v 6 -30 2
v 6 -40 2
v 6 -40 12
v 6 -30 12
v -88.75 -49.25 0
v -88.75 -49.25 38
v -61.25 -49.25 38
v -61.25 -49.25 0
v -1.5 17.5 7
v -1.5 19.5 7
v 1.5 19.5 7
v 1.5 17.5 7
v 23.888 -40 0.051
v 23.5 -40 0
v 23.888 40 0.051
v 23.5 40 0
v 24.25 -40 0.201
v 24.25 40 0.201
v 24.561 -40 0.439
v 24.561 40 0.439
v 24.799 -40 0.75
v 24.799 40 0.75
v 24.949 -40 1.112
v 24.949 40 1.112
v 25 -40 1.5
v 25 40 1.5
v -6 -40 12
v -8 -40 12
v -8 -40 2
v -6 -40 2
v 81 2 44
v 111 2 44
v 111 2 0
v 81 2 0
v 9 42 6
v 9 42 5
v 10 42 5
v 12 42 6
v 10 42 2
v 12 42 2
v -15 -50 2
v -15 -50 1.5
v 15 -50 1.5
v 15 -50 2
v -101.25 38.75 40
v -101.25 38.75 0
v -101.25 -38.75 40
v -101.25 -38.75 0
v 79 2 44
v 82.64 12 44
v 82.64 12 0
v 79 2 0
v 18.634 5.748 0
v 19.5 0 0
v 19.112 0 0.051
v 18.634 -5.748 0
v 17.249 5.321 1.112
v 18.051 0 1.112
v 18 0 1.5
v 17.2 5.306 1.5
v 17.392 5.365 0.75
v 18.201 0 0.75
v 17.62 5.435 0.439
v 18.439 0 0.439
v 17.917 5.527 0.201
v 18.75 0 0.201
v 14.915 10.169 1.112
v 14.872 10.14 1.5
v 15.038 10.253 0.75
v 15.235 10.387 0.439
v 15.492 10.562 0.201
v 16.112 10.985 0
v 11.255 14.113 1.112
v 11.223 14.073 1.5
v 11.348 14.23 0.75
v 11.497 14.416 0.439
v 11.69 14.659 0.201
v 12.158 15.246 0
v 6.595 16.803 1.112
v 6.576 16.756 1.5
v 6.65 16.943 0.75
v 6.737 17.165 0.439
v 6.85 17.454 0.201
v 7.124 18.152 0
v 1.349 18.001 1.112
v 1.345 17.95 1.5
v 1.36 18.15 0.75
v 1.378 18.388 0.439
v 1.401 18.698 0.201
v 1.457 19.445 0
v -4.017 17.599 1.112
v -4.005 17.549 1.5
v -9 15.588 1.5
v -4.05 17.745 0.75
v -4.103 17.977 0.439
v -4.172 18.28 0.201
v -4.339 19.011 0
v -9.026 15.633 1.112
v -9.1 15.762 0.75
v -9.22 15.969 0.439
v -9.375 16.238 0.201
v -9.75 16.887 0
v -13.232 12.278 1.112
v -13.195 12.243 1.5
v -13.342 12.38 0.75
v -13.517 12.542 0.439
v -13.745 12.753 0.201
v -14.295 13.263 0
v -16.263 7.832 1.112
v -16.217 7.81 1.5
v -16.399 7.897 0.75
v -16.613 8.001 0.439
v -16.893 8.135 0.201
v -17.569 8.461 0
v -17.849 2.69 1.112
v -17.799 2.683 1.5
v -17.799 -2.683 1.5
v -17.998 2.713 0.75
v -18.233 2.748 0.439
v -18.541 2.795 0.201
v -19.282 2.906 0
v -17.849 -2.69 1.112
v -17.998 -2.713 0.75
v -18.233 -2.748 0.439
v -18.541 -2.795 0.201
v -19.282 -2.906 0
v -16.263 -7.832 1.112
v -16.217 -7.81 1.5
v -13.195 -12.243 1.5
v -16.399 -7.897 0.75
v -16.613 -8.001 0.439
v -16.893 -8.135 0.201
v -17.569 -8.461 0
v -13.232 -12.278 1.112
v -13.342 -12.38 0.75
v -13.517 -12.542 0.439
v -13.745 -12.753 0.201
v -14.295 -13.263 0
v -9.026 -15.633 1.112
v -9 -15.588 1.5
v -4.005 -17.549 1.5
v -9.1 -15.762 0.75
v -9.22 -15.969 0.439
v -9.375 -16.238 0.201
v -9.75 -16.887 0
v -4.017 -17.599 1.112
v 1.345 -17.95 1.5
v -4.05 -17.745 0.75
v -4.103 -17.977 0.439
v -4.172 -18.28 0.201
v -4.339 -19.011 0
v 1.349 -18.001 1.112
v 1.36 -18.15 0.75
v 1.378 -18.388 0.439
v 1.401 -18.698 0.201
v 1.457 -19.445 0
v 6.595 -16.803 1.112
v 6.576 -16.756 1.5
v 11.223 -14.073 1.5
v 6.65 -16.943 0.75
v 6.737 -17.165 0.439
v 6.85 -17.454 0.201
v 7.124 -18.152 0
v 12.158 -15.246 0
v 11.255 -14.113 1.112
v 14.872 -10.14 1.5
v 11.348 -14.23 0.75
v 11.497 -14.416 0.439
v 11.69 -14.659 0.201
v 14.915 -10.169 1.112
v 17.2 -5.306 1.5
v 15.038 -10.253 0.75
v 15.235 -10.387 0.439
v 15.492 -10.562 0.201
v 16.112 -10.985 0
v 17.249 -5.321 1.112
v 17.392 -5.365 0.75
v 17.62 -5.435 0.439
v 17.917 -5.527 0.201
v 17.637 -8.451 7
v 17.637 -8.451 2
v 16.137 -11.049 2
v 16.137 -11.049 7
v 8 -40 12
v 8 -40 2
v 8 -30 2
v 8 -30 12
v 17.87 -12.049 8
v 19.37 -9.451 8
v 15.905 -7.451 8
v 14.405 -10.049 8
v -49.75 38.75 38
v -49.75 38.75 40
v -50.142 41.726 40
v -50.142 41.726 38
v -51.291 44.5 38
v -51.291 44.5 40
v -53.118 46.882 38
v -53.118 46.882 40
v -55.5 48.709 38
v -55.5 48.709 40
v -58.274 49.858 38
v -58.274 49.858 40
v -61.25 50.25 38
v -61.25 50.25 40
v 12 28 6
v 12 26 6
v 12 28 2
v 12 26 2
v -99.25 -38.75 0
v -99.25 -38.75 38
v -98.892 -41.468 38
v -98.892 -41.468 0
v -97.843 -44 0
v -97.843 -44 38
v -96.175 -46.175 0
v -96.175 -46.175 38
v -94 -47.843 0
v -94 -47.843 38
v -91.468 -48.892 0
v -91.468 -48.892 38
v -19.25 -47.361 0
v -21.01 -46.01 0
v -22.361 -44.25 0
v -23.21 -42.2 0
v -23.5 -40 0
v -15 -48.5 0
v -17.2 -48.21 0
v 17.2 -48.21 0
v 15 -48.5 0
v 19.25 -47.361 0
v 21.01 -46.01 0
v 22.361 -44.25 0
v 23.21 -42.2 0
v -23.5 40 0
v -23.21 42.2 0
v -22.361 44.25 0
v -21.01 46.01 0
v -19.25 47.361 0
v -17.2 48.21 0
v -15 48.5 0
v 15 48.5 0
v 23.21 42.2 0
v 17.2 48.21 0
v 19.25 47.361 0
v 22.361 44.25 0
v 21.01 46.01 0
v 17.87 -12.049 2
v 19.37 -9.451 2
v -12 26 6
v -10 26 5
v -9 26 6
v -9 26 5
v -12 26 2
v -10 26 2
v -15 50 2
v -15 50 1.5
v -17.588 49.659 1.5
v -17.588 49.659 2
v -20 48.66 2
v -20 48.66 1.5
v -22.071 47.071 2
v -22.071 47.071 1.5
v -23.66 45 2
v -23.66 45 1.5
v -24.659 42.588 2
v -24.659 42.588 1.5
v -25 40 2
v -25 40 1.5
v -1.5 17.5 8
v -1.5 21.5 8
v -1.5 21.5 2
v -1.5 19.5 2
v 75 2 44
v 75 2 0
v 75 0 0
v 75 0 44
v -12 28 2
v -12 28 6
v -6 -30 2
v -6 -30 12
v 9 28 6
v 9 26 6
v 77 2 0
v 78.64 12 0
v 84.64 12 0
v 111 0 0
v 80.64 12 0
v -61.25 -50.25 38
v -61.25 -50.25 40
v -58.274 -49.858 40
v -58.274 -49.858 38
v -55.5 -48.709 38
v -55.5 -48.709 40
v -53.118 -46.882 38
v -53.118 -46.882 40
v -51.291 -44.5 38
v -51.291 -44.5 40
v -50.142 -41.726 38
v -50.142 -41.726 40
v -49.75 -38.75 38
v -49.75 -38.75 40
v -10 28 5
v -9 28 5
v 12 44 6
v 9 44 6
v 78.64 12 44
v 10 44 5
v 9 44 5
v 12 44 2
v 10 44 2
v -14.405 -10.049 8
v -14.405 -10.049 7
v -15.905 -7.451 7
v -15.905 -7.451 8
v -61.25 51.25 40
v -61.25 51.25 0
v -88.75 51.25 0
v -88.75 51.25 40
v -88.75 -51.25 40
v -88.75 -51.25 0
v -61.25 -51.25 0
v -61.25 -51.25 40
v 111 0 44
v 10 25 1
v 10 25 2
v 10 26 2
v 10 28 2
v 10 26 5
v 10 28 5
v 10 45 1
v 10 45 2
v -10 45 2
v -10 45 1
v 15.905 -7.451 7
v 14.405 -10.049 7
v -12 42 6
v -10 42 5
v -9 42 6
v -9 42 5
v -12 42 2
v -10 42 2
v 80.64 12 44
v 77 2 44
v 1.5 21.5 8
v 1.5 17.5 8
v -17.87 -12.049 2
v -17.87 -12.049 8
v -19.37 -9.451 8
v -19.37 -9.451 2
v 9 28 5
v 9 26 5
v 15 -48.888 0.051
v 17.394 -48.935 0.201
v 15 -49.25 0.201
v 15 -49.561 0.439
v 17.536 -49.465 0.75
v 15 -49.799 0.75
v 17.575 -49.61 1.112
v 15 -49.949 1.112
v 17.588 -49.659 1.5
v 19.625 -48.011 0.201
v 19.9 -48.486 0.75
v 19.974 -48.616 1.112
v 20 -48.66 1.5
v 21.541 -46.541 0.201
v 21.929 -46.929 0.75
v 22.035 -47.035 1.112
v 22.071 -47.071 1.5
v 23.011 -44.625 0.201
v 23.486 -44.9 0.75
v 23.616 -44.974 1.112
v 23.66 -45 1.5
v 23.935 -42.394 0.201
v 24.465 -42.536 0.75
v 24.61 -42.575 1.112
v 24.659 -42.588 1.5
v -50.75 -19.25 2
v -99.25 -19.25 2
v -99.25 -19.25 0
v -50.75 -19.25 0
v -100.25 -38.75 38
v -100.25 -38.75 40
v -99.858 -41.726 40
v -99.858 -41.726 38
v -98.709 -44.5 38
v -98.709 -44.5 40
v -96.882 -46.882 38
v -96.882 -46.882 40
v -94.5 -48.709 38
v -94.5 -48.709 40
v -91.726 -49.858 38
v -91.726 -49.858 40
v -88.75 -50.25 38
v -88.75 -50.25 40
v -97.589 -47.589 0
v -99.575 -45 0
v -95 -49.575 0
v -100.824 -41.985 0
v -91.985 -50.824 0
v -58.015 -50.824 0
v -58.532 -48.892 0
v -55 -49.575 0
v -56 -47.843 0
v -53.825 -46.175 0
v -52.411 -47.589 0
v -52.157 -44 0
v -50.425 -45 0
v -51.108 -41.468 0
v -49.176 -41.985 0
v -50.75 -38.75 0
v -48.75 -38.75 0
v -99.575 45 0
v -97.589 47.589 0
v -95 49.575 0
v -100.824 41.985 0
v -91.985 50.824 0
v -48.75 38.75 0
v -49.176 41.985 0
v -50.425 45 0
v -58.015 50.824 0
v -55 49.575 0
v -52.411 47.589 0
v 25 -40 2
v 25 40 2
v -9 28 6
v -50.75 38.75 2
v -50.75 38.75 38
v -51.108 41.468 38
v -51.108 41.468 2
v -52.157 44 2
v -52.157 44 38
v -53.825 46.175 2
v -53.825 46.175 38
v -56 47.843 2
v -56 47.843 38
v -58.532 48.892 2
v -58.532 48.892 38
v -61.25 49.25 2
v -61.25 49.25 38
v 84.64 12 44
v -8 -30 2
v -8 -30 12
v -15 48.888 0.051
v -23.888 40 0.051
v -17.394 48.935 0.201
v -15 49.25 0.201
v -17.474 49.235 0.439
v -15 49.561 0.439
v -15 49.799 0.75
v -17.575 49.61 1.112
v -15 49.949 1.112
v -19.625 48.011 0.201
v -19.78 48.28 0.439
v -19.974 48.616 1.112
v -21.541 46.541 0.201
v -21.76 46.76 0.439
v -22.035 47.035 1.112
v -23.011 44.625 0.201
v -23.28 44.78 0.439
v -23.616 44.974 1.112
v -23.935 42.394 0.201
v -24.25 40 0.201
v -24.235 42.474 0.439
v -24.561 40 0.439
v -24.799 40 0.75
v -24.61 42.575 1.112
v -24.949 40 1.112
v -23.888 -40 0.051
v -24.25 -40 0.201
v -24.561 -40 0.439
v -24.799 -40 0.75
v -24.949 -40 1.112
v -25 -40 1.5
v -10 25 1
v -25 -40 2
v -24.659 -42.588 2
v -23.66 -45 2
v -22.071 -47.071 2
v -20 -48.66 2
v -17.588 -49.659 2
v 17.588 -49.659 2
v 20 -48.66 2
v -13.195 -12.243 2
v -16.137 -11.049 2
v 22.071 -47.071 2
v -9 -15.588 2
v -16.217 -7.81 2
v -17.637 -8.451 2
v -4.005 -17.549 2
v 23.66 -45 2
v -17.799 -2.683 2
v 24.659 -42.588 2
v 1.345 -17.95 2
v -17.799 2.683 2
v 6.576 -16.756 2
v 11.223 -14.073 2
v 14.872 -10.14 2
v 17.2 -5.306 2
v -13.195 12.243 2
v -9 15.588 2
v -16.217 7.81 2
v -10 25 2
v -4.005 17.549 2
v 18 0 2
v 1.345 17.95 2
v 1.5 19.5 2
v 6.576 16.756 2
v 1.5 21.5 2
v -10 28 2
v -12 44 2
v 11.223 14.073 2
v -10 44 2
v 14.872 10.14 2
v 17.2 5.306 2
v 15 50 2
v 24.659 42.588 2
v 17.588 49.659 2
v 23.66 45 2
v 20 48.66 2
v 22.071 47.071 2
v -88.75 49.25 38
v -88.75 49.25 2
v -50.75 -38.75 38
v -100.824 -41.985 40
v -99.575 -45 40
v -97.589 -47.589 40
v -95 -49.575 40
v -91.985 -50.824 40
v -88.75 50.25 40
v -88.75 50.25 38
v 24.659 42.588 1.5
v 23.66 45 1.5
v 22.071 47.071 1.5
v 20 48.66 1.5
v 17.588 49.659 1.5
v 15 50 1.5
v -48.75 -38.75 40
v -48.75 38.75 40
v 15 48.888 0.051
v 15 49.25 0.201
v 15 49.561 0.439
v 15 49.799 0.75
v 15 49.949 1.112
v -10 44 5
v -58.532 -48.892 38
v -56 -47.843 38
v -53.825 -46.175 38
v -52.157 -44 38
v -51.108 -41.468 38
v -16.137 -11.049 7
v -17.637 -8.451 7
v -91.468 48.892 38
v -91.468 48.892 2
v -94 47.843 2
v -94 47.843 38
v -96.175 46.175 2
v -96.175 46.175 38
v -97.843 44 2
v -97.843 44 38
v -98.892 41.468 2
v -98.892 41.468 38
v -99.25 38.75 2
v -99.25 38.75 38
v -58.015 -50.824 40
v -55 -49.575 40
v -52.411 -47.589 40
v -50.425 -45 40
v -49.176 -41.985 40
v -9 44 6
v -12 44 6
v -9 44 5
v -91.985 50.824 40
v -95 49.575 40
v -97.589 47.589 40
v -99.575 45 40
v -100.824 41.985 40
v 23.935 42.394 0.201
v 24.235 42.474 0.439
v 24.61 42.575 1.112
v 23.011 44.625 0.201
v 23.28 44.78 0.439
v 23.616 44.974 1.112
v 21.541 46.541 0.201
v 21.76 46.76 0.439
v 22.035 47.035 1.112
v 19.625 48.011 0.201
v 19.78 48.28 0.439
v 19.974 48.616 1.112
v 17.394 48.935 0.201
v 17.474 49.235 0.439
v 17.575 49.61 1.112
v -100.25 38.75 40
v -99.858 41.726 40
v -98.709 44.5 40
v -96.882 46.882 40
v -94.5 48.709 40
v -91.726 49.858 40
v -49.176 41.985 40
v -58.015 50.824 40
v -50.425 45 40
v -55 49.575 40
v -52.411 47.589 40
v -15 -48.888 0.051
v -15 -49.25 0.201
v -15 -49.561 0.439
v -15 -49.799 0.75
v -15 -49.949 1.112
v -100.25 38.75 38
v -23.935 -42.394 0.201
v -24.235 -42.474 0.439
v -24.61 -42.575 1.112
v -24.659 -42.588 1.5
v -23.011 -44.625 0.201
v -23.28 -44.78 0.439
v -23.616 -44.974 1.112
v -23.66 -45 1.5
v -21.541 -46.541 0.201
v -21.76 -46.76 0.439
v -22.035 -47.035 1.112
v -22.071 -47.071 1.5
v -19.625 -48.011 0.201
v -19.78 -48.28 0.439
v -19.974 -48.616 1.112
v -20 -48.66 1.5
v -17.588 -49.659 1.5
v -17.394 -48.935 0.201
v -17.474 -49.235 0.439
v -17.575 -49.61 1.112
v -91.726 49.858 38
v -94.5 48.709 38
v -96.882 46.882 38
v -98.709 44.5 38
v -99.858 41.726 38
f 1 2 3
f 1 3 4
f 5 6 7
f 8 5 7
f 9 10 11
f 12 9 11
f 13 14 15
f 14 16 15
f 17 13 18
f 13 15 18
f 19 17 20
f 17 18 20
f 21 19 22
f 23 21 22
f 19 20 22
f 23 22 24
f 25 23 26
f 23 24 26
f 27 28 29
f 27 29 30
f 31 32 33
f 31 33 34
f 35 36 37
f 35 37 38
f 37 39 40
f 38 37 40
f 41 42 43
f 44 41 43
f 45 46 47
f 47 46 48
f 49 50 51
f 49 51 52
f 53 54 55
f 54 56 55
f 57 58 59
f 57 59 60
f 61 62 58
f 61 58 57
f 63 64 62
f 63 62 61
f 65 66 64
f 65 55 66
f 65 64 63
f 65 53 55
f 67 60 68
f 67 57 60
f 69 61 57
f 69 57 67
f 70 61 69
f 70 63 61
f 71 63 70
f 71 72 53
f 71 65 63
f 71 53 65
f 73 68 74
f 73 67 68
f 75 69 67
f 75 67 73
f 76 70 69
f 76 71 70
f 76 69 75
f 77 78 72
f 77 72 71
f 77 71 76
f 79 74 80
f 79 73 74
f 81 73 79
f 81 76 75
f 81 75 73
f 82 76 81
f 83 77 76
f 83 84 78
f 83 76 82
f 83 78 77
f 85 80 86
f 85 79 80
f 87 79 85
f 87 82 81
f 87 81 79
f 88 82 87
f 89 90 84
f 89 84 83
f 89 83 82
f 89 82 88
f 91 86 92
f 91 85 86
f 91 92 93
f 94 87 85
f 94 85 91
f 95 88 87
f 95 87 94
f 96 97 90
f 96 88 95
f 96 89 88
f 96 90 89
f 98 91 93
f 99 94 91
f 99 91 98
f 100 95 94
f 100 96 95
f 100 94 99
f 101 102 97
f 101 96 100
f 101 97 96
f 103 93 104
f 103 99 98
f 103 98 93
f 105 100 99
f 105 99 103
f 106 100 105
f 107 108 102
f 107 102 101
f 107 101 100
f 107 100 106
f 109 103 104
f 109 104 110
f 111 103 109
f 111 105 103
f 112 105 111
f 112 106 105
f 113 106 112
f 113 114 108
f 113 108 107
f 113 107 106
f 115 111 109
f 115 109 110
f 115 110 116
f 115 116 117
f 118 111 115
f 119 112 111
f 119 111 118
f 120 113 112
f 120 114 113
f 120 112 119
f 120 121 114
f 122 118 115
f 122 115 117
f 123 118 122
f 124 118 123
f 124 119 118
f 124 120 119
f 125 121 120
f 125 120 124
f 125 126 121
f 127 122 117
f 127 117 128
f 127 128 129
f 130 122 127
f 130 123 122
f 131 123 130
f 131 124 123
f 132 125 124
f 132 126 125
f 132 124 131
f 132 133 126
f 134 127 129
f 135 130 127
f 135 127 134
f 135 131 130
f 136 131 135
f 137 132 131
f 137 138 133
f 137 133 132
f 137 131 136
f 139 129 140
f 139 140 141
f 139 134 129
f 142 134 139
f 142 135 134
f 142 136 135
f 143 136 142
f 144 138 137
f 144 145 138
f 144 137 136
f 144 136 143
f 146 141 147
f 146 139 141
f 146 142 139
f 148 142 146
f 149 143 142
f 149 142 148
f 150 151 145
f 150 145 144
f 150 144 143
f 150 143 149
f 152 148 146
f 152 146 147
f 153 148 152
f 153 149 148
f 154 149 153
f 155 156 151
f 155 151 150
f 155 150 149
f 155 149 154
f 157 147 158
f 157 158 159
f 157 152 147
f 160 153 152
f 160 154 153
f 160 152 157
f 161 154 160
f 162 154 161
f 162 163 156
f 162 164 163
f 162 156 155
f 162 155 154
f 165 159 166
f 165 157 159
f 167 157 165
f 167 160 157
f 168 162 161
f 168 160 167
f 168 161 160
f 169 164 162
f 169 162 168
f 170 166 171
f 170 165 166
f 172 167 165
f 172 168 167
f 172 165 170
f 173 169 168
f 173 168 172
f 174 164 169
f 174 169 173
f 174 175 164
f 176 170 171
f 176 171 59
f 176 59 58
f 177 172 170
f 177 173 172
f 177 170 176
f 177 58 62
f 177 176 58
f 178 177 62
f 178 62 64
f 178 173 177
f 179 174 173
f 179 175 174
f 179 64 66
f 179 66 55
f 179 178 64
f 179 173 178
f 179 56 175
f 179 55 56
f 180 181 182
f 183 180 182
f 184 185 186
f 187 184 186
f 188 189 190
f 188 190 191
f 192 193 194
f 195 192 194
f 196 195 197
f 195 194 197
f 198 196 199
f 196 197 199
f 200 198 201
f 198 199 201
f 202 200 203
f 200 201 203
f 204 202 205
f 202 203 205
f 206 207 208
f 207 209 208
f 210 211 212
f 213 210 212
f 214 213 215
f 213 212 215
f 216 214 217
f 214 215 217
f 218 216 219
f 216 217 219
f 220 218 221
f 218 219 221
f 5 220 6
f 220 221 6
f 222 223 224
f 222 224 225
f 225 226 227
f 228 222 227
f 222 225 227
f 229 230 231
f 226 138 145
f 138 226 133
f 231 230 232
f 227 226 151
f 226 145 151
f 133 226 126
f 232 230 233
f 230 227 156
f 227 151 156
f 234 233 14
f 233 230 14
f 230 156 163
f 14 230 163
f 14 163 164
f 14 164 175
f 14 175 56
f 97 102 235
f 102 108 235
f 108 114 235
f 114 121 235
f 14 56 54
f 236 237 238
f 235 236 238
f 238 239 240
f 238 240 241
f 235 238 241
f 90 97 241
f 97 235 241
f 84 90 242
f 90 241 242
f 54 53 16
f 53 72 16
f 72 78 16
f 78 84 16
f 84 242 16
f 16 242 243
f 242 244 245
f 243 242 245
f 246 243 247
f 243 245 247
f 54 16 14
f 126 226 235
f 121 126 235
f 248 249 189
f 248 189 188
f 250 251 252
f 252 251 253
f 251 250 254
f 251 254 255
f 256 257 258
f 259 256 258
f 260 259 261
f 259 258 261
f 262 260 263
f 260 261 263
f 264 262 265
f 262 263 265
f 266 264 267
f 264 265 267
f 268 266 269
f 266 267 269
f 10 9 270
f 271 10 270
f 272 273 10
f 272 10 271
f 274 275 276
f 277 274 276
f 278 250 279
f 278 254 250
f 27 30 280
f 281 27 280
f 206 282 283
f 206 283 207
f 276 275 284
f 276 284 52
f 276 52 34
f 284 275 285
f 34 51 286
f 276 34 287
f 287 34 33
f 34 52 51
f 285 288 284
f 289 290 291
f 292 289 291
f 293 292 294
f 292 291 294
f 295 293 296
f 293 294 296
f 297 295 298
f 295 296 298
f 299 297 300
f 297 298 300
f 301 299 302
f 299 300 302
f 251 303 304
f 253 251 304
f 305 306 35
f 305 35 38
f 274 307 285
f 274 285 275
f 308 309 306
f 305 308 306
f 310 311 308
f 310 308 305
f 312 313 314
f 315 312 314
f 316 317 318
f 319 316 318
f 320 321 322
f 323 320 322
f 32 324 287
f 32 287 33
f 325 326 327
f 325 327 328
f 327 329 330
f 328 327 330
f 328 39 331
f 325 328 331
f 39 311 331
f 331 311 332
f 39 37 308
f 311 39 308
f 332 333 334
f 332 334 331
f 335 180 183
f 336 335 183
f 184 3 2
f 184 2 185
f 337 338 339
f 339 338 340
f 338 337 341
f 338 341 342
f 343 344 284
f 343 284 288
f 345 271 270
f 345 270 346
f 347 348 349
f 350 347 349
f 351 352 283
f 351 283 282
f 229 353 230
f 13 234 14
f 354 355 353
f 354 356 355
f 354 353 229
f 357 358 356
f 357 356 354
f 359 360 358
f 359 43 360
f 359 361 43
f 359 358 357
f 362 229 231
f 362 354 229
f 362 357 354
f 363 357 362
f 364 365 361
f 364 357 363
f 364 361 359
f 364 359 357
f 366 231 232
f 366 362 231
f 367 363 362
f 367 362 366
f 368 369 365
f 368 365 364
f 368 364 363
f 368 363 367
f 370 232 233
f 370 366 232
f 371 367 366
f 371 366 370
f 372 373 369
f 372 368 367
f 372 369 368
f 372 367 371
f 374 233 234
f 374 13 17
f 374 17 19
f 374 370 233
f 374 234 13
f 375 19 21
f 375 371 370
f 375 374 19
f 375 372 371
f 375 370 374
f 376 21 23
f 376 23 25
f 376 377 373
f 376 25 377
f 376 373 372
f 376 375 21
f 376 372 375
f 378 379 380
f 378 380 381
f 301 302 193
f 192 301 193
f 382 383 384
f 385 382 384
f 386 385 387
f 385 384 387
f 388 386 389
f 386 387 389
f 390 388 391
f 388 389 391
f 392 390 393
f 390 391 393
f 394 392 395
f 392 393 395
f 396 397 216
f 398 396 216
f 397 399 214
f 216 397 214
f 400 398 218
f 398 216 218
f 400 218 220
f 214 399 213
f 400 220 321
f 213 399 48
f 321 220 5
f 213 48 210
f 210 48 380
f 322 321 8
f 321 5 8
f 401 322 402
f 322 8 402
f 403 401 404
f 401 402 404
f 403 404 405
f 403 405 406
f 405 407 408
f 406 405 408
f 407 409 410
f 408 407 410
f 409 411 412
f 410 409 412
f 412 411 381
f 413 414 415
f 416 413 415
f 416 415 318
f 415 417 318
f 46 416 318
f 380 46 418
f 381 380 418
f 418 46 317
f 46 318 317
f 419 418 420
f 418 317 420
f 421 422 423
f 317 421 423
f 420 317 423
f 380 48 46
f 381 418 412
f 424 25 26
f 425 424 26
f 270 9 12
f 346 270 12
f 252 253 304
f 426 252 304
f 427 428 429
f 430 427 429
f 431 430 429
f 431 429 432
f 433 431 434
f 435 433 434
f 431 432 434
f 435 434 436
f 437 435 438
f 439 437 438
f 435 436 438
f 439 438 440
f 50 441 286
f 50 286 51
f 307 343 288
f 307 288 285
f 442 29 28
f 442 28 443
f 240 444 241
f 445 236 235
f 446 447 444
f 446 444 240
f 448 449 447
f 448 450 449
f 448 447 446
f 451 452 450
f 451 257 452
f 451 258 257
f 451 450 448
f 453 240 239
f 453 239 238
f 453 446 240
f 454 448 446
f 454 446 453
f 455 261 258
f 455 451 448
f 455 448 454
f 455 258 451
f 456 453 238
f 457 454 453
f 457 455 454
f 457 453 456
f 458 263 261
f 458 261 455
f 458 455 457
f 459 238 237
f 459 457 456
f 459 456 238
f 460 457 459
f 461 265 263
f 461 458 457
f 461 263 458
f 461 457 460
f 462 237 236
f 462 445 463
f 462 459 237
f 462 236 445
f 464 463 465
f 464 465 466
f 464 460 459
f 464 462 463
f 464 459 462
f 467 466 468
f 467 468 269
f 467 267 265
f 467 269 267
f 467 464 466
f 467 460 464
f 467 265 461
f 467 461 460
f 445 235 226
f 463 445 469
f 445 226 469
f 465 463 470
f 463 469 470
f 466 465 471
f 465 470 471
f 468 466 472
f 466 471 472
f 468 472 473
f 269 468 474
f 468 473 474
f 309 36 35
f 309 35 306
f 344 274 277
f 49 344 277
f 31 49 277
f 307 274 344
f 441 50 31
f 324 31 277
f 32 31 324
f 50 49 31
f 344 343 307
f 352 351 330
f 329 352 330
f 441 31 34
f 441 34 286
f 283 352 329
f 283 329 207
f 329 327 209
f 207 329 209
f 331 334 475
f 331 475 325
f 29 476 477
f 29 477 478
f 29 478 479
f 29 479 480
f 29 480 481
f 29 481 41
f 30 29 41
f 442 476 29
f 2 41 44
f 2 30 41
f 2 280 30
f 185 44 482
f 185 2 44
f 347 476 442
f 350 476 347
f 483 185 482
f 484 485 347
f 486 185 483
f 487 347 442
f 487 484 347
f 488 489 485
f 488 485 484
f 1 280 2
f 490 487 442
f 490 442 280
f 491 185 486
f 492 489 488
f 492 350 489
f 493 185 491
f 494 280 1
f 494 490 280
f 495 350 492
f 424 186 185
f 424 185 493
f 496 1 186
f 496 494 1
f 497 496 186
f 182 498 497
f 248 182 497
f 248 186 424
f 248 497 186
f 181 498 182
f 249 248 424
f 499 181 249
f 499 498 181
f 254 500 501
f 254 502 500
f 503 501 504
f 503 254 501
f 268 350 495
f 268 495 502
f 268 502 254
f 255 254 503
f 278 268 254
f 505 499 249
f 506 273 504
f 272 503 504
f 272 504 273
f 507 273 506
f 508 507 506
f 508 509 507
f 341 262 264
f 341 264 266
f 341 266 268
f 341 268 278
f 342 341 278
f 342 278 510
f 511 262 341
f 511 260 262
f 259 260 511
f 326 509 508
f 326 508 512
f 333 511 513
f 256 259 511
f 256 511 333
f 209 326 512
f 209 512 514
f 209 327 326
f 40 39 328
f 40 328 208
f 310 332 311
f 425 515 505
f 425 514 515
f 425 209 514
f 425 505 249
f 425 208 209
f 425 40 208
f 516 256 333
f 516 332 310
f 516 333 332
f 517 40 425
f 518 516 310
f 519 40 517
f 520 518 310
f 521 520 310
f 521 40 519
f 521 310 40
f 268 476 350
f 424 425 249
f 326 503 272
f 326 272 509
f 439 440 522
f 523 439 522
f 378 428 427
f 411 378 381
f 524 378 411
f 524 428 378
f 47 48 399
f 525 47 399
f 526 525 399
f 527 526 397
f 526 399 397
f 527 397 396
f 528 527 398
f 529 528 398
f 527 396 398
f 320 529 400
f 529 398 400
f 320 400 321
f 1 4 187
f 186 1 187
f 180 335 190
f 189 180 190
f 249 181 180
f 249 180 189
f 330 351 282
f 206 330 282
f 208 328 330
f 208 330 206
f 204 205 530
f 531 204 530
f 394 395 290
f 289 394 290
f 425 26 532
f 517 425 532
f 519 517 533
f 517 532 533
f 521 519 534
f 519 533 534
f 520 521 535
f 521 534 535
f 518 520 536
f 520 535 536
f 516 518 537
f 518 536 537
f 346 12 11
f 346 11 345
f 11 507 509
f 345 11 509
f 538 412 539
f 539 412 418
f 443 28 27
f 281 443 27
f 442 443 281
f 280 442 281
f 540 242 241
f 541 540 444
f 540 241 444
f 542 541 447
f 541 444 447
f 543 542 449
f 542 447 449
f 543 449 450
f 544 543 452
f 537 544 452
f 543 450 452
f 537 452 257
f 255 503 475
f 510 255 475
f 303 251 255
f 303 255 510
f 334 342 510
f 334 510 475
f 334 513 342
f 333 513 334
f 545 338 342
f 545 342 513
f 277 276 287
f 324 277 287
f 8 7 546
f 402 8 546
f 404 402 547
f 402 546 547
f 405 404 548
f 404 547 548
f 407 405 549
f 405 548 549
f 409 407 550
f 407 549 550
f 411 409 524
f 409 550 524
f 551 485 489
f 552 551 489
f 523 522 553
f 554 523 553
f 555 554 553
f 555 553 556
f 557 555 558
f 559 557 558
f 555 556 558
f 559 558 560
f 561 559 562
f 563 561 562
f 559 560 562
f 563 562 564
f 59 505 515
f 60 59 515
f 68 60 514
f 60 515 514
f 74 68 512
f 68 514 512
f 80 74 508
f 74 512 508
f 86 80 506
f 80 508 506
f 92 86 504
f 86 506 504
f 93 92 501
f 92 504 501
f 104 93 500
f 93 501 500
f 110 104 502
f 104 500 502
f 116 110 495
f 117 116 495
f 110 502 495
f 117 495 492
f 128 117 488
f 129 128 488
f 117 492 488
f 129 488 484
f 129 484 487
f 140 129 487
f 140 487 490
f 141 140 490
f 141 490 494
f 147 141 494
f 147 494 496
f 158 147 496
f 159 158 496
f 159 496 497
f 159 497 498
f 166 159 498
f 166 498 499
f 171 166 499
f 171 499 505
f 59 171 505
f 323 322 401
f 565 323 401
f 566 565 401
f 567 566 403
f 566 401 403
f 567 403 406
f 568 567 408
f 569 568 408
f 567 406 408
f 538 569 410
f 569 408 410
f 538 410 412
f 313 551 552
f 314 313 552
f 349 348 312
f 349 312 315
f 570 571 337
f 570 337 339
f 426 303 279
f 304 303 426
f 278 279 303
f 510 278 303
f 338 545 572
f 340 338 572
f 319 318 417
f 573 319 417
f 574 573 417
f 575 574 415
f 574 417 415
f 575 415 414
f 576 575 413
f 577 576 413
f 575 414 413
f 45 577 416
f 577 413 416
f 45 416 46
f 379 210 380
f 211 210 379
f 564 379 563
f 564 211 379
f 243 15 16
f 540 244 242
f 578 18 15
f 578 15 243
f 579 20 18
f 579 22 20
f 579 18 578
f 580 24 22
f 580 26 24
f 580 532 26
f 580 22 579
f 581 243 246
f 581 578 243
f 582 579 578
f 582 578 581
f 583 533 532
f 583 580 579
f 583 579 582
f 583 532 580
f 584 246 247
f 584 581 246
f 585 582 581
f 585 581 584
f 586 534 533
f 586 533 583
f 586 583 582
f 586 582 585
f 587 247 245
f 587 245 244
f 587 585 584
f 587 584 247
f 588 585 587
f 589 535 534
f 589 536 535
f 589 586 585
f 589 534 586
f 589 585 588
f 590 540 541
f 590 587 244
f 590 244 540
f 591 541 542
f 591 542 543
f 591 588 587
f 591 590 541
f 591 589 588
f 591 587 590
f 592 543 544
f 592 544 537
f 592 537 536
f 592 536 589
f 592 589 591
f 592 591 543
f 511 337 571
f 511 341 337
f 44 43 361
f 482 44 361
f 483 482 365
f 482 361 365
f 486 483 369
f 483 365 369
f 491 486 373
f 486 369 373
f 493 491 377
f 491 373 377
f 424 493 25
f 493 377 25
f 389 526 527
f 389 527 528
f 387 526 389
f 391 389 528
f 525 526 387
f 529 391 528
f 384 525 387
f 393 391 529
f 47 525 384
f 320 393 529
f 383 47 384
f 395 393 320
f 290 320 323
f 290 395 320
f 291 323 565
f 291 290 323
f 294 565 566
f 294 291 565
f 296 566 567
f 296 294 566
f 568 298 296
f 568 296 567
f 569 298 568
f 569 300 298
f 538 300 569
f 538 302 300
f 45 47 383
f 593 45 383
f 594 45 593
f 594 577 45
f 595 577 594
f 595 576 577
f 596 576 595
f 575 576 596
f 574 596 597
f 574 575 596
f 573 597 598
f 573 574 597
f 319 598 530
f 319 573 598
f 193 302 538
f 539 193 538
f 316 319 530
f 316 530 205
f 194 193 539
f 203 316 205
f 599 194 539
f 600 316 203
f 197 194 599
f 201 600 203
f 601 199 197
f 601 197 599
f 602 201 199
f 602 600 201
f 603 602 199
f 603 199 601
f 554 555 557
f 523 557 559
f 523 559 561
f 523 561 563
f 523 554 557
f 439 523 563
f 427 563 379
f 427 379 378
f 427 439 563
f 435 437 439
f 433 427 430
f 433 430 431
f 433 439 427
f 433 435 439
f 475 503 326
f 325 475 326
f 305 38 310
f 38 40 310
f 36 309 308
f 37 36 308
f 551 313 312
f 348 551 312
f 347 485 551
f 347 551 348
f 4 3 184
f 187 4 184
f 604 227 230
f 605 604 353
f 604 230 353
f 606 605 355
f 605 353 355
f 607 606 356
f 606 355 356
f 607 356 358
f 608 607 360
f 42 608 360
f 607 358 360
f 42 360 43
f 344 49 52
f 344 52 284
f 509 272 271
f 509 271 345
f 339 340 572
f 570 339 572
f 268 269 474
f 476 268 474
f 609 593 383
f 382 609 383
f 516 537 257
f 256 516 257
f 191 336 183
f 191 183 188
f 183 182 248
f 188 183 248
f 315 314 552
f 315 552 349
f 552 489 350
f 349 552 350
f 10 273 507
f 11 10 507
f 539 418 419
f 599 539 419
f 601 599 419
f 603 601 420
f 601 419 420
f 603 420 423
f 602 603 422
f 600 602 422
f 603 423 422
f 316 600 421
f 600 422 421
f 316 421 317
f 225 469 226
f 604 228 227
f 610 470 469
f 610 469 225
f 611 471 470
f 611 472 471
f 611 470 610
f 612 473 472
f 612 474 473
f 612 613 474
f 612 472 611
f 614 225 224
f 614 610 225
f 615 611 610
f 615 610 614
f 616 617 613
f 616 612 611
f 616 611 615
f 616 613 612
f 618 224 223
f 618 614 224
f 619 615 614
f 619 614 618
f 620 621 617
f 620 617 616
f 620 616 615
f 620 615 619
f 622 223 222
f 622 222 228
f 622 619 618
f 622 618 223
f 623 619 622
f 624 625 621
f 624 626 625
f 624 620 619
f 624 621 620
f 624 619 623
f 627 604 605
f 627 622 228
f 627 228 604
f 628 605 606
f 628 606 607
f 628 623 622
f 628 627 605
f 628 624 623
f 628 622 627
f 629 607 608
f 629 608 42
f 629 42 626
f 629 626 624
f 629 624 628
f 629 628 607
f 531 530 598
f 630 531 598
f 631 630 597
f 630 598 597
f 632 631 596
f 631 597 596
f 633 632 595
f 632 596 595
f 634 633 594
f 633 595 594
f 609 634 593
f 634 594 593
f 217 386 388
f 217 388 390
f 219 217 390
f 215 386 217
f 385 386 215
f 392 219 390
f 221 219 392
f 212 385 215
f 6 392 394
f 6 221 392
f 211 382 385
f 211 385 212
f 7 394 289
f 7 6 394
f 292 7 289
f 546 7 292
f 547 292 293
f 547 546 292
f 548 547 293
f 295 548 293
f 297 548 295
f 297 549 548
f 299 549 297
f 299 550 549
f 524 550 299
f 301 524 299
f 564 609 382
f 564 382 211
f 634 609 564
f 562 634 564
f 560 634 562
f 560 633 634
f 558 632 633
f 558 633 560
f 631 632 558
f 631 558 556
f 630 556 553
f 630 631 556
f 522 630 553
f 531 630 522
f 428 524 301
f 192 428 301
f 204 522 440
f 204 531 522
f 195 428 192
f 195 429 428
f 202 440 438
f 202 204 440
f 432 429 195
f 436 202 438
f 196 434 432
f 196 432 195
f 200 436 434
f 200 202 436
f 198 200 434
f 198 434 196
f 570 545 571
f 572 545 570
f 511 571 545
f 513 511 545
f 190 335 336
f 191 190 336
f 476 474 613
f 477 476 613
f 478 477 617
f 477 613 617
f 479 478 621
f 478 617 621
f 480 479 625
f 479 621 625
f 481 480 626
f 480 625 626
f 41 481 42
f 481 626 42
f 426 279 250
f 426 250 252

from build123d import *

# Parameters (mm, degrees)
PAD_DEPTH          = 2
SKETCH007_W        = 20
SKETCH007_H        = 20
POCKET001_DEPTH    = 1
SKETCH002_R        = 18
POCKET_DEPTH       = 2.001
SKETCH004_W        = 3
SKETCH004_H        = 2
PAD003_DEPTH       = 5
SKETCH005_W        = 3
SKETCH005_H        = 4
PAD004_DEPTH       = 1
POLARPATTERN_COUNT = 3
FILLET_R           = 1.5
SKETCH008_W        = 2
SKETCH008_H        = 2
PAD006_DEPTH       = 3
SKETCH009_W        = 3
SKETCH009_H        = 2
PAD007_DEPTH       = 1
SKETCH010_W        = 3
SKETCH010_H        = 2
PAD008_DEPTH       = 1
SKETCH011_W        = 3
SKETCH011_H        = 2
PAD009_DEPTH       = 1
SKETCH012_W        = 3
SKETCH012_H        = 2
PAD010_DEPTH       = 1
SKETCH017_W        = 2
SKETCH017_H        = 10
PAD012_DEPTH       = 10
PAD002_DEPTH       = 44
PAD011_DEPTH       = 40
POCKET002_DEPTH    = 2
POCKET003_DEPTH    = 36
POCKET004_DEPTH    = 2.001


with BuildPart() as body:
    # Sketch → Pad (new body)
    with BuildSketch(Plane.XY):
        with BuildLine():
            Line((-25, 40), (-25, -40))
            ThreePointArc((-25, -40), (-22.071068, -47.071068), (-15, -50))
            Line((-15, -50), (15, -50))
            ThreePointArc((15, -50), (22.071068, -47.071068), (25, -40))
            Line((25, -40), (25, 40))
            ThreePointArc((25, 40), (22.071068, 47.071068), (15, 50))
            Line((15, 50), (-15, 50))
            ThreePointArc((-15, 50), (-22.071068, 47.071068), (-25, 40))
        make_face()
    extrude(amount=PAD_DEPTH)

    # Sketch007 (on Face10 of Pad) → Pocket001 (cut)
    with BuildSketch(Plane.XY.offset(2)):
        with Locations((0, 35)):
            Rectangle(SKETCH007_W, SKETCH007_H)
    extrude(amount=-POCKET001_DEPTH, mode=Mode.SUBTRACT)

    # Sketch002 (on Face10 of Pad) → Pocket (cut, through all)
    with BuildSketch(Plane.XY.offset(2)):
        Circle(SKETCH002_R)
    extrude(amount=-POCKET_DEPTH, mode=Mode.SUBTRACT)

    # Sketch004 (on Face10 of Pad) → Pad003 (join)
    with BuildSketch(Plane.XY.offset(2)):
        with Locations((0, 20.5)):
            Rectangle(SKETCH004_W, SKETCH004_H)
    pad003 = extrude(amount=PAD003_DEPTH)

    # Sketch005 (on Face20 of Pad003) → Pad004 (join)
    with BuildSketch(Plane.XY.offset(7)):
        with Locations((0, 19.5)):
            Rectangle(SKETCH005_W, SKETCH005_H)
    pad004 = extrude(amount=PAD004_DEPTH)

    # PolarPattern: Pad003, Pad004 ×3 about axis
    polarpattern_axis = Axis((0, 0, 2), (0, 0, 1))
    for i in range(1, POLARPATTERN_COUNT):
        add(pad003.rotate(polarpattern_axis, i * 360 / POLARPATTERN_COUNT))
        add(pad004.rotate(polarpattern_axis, i * 360 / POLARPATTERN_COUNT))

    # Fillet
    fillet_edges = [body.edges().sort_by_distance(p)[0] for p in [
        (-18, 0, 0),
        (25, 0, 0),
        (22.071068, 47.071068, 0),
        (0, 50, 0),
        (-22.071068, 47.071068, 0),
        (-25, 0, 0),
    ]]
    fillet(fillet_edges, radius=FILLET_R)

    # Sketch008 (on Face10 of Pad) → Pad006 (join)
    with BuildSketch(Plane.XY.offset(2)):
        with Locations((-11, 43)):
            Rectangle(SKETCH008_W, SKETCH008_H)
        with Locations((11, 43)):
            Rectangle(SKETCH008_W, SKETCH008_H)
        with Locations((11, 27)):
            Rectangle(SKETCH008_W, SKETCH008_H)
        with Locations((-11, 27)):
            Rectangle(SKETCH008_W, SKETCH008_H)
    extrude(amount=PAD006_DEPTH)

    # Sketch009 (on Face57 of Pad006) → Pad007 (join)
    with BuildSketch(Plane.XY.offset(5)):
        with Locations((-10.5, 43)):
            Rectangle(SKETCH009_W, SKETCH009_H)
    extrude(amount=PAD007_DEPTH)

    # Sketch010 (on Face56 of Pad007) → Pad008 (join)
    with BuildSketch(Plane.XY.offset(5)):
        with Locations((-10.5, 27)):
            Rectangle(SKETCH010_W, SKETCH010_H)
    extrude(amount=PAD008_DEPTH)

    # Sketch011 (on Face61 of Pad008) → Pad009 (join)
    with BuildSketch(Plane.XY.offset(5)):
        with Locations((10.5, 43)):
            Rectangle(SKETCH011_W, SKETCH011_H)
    extrude(amount=PAD009_DEPTH)

    # Sketch012 (on Face62 of Pad009) → Pad010 (join)
    with BuildSketch(Plane.XY.offset(5)):
        with Locations((10.5, 27)):
            Rectangle(SKETCH012_W, SKETCH012_H)
    extrude(amount=PAD010_DEPTH)

    # Sketch017 (on Face4 of Pad010) → Pad012 (join)
    with BuildSketch(Plane.XY.offset(2)):
        with Locations((7, -35)):
            Rectangle(SKETCH017_W, SKETCH017_H)
        with Locations((-7, -35)):
            Rectangle(SKETCH017_W, SKETCH017_H)
    extrude(amount=PAD012_DEPTH)


with BuildPart() as stand:
    # Sketch003 → Pad002 (new body)
    with BuildSketch(Plane.XY):
        Polygon((75, 0), (111, 0), (111, 2), (81, 2), (84.639702, 12), (82.639702, 12), (79, 2), (77, 2), (80.639702, 12), (78.639702, 12), (75, 2), align=None)
    extrude(amount=PAD002_DEPTH)


with BuildPart() as frame:
    # Sketch013 → Pad011 (new body)
    with BuildSketch(Plane.XY):
        with BuildLine():
            Line((-101.25, 38.75), (-101.25, -38.75))
            ThreePointArc((-101.25, -38.75), (-97.588835, -47.588835), (-88.75, -51.25))
            Line((-88.75, -51.25), (-61.25, -51.25))
            ThreePointArc((-61.25, -51.25), (-52.411165, -47.588835), (-48.75, -38.75))
            Line((-48.75, -38.75), (-48.75, 38.75))
            ThreePointArc((-48.75, 38.75), (-52.411165, 47.588835), (-61.25, 51.25))
            Line((-61.25, 51.25), (-88.75, 51.25))
            ThreePointArc((-88.75, 51.25), (-97.588835, 47.588835), (-101.25, 38.75))
        make_face()
    extrude(amount=PAD011_DEPTH)

    # Sketch014 (on Face10 of Pad011) → Pocket002 (cut)
    with BuildSketch(Plane.XY.offset(40)):
        with BuildLine():
            Line((-100.25, 38.75), (-100.25, -38.75))
            ThreePointArc((-100.25, -38.75), (-96.881728, -46.881728), (-88.75, -50.25))
            Line((-88.75, -50.25), (-61.25, -50.25))
            ThreePointArc((-61.25, -50.25), (-53.118272, -46.881728), (-49.75, -38.75))
            Line((-49.75, -38.75), (-49.75, 38.75))
            ThreePointArc((-49.75, 38.75), (-53.118272, 46.881728), (-61.25, 50.25))
            Line((-61.25, 50.25), (-88.75, 50.25))
            ThreePointArc((-88.75, 50.25), (-96.881728, 46.881728), (-100.25, 38.75))
        make_face()
    extrude(amount=-POCKET002_DEPTH, mode=Mode.SUBTRACT)

    # Sketch015 (on Face19 of Pocket002) → Pocket003 (cut)
    with BuildSketch(Plane.XY.offset(38)):
        with BuildLine():
            Line((-99.25, 38.75), (-99.25, -38.75))
            ThreePointArc((-99.25, -38.75), (-96.174621, -46.174621), (-88.75, -49.25))
            Line((-88.75, -49.25), (-61.25, -49.25))
            ThreePointArc((-61.25, -49.25), (-53.825379, -46.174621), (-50.75, -38.75))
            Line((-50.75, -38.75), (-50.75, 38.75))
            ThreePointArc((-50.75, 38.75), (-53.825379, 46.174621), (-61.25, 49.25))
            Line((-61.25, 49.25), (-88.75, 49.25))
            ThreePointArc((-88.75, 49.25), (-96.174621, 46.174621), (-99.25, 38.75))
        make_face()
    extrude(amount=-POCKET003_DEPTH, mode=Mode.SUBTRACT)

    # Sketch016 (on Face28 of Pocket003) → Pocket004 (cut, through all)
    with BuildSketch(Plane.XY.offset(2)):
        with BuildLine():
            Line((-88.75, -49.25), (-61.25, -49.25))
            ThreePointArc((-61.25, -49.25), (-53.825379, -46.174621), (-50.75, -38.75))
            Line((-50.75, -19.25), (-50.75, -38.75))
            Line((-99.25, -19.25), (-50.75, -19.25))
            Line((-99.25, -38.75), (-99.25, -19.25))
            ThreePointArc((-99.25, -38.75), (-96.174621, -46.174621), (-88.75, -49.25))
        make_face()
    extrude(amount=-POCKET004_DEPTH, mode=Mode.SUBTRACT)


solid = Compound([body.part, stand.part, frame.part])
